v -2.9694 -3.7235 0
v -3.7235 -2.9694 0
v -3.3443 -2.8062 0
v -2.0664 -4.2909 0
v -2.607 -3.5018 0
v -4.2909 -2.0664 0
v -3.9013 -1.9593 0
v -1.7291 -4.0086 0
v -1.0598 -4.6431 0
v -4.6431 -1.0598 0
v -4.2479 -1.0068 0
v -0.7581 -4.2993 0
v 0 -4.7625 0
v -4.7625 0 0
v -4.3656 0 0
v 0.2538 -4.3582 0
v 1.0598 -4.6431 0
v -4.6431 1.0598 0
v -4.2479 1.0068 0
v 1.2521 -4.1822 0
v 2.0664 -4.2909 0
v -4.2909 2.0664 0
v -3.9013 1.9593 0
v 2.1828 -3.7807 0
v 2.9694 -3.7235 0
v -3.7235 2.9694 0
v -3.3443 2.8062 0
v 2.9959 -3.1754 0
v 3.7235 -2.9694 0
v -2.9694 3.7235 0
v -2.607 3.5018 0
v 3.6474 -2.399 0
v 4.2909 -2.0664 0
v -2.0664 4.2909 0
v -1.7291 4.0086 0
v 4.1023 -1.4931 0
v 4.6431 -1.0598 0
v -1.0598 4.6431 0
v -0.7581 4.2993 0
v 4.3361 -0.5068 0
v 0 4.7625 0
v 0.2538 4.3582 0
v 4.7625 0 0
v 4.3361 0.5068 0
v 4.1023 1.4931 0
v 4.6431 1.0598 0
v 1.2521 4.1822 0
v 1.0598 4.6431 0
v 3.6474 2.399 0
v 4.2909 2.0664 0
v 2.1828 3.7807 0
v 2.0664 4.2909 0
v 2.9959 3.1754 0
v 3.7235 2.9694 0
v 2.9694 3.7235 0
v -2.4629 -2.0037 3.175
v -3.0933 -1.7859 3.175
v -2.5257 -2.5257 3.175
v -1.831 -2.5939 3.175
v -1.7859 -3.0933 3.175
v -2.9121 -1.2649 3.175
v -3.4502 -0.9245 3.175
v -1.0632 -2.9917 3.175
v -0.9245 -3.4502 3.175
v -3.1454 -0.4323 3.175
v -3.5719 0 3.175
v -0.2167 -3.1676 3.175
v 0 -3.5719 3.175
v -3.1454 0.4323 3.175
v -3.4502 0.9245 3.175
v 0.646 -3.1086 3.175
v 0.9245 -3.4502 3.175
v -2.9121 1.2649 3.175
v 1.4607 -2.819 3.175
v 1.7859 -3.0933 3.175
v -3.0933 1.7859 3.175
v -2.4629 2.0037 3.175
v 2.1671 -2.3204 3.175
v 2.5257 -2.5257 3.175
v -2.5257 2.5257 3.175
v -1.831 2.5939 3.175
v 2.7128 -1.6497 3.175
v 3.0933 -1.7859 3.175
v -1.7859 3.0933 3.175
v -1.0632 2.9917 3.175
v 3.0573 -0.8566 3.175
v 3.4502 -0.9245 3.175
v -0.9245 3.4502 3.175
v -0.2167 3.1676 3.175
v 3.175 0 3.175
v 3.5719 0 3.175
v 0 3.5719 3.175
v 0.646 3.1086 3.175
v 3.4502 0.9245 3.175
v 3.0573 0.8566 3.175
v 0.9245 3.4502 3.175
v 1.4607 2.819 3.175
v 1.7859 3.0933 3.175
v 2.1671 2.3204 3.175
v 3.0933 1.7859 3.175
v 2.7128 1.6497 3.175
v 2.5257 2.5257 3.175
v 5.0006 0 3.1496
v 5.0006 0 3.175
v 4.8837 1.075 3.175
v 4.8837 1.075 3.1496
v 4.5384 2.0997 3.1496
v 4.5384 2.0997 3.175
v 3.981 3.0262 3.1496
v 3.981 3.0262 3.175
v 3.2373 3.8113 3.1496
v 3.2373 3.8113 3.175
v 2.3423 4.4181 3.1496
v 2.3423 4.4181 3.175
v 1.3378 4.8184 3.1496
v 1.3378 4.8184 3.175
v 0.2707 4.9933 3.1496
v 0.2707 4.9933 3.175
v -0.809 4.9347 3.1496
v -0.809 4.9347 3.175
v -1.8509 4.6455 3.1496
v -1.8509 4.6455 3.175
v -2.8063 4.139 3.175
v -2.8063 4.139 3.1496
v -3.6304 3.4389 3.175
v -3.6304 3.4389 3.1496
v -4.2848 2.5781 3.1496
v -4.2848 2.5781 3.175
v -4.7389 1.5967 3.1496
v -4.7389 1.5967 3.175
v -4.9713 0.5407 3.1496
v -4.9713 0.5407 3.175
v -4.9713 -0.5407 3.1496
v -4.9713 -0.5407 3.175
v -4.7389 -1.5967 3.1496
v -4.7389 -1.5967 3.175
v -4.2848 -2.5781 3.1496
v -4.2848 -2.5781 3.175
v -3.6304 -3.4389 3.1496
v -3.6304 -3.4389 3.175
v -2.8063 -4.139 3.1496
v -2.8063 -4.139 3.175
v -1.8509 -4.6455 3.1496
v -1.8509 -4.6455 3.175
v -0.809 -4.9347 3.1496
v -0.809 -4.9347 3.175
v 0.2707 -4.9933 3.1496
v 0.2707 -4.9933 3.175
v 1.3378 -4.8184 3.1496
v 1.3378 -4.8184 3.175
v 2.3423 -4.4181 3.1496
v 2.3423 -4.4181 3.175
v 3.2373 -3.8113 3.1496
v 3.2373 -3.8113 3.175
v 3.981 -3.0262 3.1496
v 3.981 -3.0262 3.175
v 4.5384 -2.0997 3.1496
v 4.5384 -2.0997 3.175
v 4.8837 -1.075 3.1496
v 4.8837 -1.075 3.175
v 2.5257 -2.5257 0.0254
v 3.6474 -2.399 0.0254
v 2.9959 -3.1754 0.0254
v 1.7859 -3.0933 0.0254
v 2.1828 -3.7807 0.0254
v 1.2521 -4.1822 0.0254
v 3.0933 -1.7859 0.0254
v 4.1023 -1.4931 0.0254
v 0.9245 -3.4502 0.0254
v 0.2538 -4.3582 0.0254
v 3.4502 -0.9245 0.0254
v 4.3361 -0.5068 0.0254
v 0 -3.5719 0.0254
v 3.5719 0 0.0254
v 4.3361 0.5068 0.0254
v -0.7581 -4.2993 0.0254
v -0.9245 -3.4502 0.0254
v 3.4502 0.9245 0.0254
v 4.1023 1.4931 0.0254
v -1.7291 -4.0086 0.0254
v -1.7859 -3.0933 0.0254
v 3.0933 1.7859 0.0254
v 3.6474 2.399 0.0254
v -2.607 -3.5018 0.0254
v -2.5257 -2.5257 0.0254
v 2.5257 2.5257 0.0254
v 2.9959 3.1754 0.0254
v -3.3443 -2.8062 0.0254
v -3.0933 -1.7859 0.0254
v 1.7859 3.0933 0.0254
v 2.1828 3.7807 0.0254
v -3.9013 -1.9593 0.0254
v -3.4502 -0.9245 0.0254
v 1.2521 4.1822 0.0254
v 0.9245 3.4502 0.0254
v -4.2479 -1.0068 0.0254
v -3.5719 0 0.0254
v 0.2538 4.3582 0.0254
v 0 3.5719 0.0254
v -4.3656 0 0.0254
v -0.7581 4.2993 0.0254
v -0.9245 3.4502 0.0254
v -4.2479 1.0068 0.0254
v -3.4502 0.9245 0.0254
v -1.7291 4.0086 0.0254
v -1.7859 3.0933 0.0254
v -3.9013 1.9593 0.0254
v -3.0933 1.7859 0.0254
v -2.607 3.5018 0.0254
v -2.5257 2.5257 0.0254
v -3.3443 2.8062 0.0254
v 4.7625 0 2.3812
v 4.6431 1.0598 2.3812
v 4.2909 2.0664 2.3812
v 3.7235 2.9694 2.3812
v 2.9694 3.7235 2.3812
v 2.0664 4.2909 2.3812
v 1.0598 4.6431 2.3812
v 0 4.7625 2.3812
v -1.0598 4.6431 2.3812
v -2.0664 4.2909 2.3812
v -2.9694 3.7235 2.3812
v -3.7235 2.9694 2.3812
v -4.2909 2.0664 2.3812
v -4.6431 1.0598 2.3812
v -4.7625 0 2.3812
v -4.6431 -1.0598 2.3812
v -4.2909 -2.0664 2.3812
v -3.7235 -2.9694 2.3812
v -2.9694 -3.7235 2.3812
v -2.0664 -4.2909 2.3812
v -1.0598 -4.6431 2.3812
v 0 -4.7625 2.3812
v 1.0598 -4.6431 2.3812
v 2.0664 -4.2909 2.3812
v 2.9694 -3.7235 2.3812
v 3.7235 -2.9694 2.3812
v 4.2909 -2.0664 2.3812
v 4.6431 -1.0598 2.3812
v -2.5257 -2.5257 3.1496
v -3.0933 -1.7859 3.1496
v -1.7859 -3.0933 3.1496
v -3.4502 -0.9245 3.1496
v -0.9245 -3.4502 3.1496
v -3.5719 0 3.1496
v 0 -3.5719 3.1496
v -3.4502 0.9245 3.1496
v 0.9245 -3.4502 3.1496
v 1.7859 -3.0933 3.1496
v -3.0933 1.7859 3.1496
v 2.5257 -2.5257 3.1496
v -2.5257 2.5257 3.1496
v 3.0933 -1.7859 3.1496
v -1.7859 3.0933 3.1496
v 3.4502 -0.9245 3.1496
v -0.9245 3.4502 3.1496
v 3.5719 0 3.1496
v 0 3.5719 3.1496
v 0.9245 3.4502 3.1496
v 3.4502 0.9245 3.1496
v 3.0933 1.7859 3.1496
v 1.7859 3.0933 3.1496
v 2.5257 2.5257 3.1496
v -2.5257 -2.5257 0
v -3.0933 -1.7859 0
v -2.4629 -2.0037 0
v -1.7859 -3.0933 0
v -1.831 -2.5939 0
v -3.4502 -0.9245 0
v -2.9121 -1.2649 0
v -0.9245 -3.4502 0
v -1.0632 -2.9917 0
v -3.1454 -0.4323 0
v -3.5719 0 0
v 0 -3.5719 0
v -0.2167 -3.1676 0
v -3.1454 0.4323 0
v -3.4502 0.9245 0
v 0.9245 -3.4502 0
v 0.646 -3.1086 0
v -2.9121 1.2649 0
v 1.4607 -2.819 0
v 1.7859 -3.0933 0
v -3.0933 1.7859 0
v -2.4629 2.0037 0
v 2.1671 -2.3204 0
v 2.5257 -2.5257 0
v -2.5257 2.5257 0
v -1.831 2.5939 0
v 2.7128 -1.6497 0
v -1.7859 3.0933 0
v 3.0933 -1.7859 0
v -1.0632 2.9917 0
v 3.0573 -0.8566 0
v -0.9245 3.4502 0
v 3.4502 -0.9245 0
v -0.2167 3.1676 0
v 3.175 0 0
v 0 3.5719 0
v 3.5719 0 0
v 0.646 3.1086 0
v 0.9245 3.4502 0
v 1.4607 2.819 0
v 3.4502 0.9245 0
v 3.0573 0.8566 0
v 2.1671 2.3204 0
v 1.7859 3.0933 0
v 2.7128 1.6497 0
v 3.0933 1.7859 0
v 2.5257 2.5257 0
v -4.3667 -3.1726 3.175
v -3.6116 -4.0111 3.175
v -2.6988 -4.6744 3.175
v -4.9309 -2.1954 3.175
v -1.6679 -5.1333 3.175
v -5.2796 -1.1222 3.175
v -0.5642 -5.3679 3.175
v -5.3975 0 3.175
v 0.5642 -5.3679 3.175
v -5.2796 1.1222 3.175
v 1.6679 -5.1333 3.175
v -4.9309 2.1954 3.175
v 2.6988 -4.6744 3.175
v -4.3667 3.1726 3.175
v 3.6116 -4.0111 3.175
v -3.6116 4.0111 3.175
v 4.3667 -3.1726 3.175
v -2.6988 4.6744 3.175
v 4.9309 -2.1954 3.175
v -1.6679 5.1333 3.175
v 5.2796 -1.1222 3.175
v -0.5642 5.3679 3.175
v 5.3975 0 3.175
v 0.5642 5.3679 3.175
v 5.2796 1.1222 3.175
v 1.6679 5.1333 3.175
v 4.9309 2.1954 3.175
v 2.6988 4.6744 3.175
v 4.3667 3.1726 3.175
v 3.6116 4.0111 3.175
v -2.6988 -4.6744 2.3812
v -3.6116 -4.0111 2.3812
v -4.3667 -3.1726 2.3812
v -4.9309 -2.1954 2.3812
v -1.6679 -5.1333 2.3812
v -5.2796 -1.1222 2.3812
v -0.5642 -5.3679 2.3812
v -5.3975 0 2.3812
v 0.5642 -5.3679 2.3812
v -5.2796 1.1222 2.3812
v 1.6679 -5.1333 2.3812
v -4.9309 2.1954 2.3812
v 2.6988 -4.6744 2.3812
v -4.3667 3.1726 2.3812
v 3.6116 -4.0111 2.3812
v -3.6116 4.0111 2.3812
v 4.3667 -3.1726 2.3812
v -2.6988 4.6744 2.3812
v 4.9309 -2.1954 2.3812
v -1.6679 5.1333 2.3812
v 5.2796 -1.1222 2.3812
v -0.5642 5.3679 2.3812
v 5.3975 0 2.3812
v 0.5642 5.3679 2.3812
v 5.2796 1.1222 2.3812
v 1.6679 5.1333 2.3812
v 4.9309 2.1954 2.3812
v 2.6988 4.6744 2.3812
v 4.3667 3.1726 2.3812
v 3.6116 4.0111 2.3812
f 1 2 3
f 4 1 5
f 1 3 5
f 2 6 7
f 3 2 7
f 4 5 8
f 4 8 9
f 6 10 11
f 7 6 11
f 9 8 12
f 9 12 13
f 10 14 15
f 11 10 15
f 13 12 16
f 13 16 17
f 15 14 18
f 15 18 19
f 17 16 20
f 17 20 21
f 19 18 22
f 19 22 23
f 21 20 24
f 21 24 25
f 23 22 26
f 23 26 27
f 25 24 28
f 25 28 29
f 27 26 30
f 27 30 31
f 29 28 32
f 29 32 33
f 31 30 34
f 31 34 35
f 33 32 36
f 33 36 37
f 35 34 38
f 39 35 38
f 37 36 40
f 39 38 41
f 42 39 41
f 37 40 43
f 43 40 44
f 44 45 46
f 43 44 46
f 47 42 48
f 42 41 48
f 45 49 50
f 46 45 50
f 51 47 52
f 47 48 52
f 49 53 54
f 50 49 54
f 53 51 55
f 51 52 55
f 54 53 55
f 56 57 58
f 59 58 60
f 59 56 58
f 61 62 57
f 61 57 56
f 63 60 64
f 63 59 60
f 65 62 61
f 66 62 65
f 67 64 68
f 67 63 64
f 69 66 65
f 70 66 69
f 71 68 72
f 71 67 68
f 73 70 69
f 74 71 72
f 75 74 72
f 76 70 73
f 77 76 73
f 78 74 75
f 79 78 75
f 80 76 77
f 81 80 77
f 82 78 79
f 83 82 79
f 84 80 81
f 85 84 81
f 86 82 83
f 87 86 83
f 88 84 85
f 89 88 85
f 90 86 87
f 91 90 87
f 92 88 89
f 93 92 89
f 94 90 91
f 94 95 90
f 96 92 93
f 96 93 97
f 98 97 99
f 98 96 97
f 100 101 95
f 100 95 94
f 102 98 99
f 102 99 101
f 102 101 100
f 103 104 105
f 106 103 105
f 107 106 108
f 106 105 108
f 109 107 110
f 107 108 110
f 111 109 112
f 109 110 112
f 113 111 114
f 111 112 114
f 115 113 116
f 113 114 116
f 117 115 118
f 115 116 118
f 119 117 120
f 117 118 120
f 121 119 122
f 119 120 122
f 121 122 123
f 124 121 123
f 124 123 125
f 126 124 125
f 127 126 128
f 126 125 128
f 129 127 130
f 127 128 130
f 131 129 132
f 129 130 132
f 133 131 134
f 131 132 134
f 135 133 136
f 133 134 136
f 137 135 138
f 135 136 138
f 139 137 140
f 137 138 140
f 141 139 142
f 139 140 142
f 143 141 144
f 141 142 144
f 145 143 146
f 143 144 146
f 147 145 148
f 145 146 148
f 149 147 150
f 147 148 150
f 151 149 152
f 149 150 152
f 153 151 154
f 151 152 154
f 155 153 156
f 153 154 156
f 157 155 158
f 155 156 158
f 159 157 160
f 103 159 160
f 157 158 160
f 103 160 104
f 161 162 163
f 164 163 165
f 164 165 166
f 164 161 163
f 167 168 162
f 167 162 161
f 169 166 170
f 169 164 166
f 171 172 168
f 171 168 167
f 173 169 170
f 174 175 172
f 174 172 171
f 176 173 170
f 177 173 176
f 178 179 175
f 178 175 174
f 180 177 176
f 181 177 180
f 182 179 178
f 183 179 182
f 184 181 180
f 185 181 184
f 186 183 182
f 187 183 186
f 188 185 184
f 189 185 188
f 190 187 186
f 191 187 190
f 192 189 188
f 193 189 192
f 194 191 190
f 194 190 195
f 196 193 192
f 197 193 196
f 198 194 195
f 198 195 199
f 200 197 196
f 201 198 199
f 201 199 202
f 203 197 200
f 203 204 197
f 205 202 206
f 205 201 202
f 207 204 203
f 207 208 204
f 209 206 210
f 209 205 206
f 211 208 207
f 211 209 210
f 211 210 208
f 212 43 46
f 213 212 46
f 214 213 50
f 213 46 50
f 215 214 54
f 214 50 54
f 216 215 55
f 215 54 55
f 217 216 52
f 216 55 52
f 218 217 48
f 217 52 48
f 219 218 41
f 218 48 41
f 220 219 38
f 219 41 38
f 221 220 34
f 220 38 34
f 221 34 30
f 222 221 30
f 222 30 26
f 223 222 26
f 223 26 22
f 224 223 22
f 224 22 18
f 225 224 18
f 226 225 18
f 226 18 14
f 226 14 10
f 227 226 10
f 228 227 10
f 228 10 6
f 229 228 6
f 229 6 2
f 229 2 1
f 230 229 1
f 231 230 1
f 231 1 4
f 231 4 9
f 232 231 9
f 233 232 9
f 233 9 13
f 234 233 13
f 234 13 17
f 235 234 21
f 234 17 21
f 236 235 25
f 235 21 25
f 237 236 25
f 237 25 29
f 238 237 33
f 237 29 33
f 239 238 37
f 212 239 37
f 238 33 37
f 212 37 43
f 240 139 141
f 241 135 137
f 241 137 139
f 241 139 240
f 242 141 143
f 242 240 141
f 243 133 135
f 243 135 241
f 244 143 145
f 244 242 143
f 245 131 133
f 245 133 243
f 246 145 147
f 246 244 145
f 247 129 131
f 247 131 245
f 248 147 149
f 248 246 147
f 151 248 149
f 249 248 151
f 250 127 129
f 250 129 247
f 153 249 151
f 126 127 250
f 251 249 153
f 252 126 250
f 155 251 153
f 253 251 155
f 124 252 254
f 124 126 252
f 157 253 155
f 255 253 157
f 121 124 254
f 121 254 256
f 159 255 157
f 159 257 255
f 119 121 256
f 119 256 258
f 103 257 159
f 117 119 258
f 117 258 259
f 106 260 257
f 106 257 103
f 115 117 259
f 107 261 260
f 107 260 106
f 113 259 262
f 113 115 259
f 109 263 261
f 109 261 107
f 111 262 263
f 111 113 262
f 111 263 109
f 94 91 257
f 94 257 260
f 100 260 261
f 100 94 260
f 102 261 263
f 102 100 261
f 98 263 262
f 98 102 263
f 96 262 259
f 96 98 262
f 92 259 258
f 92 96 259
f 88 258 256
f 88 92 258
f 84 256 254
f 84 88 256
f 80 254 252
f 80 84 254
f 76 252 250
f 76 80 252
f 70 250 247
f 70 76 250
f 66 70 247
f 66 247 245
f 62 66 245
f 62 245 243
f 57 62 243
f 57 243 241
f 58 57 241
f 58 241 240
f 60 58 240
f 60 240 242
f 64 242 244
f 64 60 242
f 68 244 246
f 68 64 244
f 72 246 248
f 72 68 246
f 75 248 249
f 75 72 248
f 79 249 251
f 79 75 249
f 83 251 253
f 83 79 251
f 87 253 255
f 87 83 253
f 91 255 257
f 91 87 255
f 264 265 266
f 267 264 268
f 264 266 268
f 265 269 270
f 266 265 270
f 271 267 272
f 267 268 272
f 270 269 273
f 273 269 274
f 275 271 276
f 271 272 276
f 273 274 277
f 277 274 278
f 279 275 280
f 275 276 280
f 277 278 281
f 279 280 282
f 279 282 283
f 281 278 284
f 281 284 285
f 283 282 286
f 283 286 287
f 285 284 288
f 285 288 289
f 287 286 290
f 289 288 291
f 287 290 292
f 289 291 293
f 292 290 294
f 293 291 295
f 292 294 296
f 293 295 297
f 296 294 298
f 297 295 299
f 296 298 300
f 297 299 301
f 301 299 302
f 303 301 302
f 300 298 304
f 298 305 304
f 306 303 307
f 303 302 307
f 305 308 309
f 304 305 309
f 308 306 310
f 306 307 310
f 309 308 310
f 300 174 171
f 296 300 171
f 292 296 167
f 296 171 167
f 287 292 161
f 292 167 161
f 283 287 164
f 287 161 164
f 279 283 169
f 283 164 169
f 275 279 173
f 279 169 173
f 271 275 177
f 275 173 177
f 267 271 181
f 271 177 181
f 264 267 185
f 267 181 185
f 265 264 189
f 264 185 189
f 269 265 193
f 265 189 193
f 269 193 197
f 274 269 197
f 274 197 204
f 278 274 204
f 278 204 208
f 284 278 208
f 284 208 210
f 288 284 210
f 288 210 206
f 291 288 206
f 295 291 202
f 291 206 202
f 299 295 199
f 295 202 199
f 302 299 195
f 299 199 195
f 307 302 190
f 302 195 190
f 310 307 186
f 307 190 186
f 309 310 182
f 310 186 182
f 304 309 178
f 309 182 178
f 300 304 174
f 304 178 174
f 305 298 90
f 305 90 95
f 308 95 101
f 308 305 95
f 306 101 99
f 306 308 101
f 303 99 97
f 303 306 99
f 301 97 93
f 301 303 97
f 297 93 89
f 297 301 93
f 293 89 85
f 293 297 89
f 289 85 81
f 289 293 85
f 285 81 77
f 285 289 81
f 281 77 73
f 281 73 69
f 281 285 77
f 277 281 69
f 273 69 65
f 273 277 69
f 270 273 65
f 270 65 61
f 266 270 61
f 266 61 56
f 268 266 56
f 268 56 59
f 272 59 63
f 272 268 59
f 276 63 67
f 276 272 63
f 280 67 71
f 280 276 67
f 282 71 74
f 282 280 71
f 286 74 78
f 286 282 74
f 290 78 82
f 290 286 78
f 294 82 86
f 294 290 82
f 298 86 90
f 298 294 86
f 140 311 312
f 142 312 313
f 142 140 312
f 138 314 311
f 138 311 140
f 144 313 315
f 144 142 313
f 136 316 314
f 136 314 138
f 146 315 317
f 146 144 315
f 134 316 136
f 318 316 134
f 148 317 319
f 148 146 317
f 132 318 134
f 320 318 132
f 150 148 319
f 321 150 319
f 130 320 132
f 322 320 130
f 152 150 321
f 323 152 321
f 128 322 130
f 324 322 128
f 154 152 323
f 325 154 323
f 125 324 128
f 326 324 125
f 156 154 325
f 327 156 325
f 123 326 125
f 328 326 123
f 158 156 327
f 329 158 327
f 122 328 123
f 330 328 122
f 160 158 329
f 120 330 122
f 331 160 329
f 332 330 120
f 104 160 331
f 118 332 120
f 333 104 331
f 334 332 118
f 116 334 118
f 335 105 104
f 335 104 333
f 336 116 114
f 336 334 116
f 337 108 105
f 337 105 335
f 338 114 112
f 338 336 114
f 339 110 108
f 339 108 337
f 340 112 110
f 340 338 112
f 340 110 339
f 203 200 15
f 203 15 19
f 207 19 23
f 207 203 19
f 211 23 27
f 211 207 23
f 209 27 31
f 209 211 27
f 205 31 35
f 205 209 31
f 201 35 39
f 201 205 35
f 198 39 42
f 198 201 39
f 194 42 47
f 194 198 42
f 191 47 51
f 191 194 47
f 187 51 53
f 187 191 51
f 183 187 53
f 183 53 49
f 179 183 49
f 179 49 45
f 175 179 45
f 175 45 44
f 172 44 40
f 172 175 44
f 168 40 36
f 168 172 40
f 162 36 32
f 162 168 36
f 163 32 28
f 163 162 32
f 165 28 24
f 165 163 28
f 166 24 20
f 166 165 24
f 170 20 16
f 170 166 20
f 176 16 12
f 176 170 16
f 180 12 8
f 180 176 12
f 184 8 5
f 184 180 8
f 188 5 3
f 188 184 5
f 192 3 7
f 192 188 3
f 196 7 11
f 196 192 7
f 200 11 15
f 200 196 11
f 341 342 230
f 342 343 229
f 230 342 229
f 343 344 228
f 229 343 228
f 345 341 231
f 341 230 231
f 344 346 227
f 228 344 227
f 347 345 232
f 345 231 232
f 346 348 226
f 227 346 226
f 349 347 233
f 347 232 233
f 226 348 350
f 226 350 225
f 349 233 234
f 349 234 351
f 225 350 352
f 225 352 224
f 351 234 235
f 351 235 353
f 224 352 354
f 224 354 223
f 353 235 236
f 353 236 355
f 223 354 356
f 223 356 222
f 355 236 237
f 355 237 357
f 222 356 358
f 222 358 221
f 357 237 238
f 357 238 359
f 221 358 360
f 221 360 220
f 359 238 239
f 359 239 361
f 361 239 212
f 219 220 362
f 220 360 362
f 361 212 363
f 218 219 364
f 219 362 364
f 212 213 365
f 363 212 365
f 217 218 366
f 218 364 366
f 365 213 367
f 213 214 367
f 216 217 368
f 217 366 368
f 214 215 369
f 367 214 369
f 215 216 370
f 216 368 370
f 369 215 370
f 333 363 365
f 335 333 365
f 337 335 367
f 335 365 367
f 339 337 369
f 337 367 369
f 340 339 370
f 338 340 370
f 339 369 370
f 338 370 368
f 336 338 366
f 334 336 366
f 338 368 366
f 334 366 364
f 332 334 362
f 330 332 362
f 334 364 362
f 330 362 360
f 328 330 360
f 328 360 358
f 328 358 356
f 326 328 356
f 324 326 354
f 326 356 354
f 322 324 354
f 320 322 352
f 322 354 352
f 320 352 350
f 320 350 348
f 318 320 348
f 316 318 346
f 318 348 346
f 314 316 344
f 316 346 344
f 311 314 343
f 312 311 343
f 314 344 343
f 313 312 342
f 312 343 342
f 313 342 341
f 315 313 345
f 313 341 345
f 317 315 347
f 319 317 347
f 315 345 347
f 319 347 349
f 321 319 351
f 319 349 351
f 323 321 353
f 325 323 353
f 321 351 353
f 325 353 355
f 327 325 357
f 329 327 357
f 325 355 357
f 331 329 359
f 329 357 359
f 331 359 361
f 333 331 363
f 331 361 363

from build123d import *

# Parameters (mm, degrees)
SKETCH1_R           = 4.7625
SKETCH1_R_2         = 3.175
BOSS_EXTRUDE1_DEPTH = 3.175
BOSS_EXTRUDE2_START = -0.79375
SKETCH2_R           = 5.3975
SKETCH2_R_2         = 4.7625
BOSS_EXTRUDE2_DEPTH = 0.79375
SKETCH3_R           = 5.000625
SKETCH3_R_2         = 3.571875
CUT_EXTRUDE1_DEPTH  = 0.0254
CUT_EXTRUDE2_START  = -0.0254
SKETCH4_R           = 4.365625
SKETCH4_R_2         = 3.571875
CUT_EXTRUDE2_DEPTH  = 0.0254


with BuildPart() as part:
    # Sketch1 → Boss-Extrude1 (new body)
    with BuildSketch(Plane.XY):
        Circle(SKETCH1_R)
        Circle(SKETCH1_R_2, mode=Mode.SUBTRACT)
    extrude(amount=BOSS_EXTRUDE1_DEPTH)

    # Sketch2 → Boss-Extrude2 (add)
    with BuildSketch(Plane.XY.offset(3.175).offset(BOSS_EXTRUDE2_START)):
        Circle(SKETCH2_R)
        Circle(SKETCH2_R_2, mode=Mode.SUBTRACT)
    extrude(amount=BOSS_EXTRUDE2_DEPTH)

    # Sketch3 → Cut-Extrude1 (cut)
    with BuildSketch(Plane.XY.offset(3.175)):
        Circle(SKETCH3_R)
        Circle(SKETCH3_R_2, mode=Mode.SUBTRACT)
    extrude(amount=-CUT_EXTRUDE1_DEPTH, mode=Mode.SUBTRACT)

    # Sketch4 → Cut-Extrude2 (cut)
    with BuildSketch(Plane(origin=(0, 0, 0), x_dir=(-1, 0, 0), z_dir=(0, 0, -1)).offset(CUT_EXTRUDE2_START)):
        Circle(SKETCH4_R)
        with Locations(Location((0, 0, 0), (0, 0, 180))):
            Circle(SKETCH4_R_2, mode=Mode.SUBTRACT)
    extrude(amount=CUT_EXTRUDE2_DEPTH, mode=Mode.SUBTRACT)


solid = part.part
